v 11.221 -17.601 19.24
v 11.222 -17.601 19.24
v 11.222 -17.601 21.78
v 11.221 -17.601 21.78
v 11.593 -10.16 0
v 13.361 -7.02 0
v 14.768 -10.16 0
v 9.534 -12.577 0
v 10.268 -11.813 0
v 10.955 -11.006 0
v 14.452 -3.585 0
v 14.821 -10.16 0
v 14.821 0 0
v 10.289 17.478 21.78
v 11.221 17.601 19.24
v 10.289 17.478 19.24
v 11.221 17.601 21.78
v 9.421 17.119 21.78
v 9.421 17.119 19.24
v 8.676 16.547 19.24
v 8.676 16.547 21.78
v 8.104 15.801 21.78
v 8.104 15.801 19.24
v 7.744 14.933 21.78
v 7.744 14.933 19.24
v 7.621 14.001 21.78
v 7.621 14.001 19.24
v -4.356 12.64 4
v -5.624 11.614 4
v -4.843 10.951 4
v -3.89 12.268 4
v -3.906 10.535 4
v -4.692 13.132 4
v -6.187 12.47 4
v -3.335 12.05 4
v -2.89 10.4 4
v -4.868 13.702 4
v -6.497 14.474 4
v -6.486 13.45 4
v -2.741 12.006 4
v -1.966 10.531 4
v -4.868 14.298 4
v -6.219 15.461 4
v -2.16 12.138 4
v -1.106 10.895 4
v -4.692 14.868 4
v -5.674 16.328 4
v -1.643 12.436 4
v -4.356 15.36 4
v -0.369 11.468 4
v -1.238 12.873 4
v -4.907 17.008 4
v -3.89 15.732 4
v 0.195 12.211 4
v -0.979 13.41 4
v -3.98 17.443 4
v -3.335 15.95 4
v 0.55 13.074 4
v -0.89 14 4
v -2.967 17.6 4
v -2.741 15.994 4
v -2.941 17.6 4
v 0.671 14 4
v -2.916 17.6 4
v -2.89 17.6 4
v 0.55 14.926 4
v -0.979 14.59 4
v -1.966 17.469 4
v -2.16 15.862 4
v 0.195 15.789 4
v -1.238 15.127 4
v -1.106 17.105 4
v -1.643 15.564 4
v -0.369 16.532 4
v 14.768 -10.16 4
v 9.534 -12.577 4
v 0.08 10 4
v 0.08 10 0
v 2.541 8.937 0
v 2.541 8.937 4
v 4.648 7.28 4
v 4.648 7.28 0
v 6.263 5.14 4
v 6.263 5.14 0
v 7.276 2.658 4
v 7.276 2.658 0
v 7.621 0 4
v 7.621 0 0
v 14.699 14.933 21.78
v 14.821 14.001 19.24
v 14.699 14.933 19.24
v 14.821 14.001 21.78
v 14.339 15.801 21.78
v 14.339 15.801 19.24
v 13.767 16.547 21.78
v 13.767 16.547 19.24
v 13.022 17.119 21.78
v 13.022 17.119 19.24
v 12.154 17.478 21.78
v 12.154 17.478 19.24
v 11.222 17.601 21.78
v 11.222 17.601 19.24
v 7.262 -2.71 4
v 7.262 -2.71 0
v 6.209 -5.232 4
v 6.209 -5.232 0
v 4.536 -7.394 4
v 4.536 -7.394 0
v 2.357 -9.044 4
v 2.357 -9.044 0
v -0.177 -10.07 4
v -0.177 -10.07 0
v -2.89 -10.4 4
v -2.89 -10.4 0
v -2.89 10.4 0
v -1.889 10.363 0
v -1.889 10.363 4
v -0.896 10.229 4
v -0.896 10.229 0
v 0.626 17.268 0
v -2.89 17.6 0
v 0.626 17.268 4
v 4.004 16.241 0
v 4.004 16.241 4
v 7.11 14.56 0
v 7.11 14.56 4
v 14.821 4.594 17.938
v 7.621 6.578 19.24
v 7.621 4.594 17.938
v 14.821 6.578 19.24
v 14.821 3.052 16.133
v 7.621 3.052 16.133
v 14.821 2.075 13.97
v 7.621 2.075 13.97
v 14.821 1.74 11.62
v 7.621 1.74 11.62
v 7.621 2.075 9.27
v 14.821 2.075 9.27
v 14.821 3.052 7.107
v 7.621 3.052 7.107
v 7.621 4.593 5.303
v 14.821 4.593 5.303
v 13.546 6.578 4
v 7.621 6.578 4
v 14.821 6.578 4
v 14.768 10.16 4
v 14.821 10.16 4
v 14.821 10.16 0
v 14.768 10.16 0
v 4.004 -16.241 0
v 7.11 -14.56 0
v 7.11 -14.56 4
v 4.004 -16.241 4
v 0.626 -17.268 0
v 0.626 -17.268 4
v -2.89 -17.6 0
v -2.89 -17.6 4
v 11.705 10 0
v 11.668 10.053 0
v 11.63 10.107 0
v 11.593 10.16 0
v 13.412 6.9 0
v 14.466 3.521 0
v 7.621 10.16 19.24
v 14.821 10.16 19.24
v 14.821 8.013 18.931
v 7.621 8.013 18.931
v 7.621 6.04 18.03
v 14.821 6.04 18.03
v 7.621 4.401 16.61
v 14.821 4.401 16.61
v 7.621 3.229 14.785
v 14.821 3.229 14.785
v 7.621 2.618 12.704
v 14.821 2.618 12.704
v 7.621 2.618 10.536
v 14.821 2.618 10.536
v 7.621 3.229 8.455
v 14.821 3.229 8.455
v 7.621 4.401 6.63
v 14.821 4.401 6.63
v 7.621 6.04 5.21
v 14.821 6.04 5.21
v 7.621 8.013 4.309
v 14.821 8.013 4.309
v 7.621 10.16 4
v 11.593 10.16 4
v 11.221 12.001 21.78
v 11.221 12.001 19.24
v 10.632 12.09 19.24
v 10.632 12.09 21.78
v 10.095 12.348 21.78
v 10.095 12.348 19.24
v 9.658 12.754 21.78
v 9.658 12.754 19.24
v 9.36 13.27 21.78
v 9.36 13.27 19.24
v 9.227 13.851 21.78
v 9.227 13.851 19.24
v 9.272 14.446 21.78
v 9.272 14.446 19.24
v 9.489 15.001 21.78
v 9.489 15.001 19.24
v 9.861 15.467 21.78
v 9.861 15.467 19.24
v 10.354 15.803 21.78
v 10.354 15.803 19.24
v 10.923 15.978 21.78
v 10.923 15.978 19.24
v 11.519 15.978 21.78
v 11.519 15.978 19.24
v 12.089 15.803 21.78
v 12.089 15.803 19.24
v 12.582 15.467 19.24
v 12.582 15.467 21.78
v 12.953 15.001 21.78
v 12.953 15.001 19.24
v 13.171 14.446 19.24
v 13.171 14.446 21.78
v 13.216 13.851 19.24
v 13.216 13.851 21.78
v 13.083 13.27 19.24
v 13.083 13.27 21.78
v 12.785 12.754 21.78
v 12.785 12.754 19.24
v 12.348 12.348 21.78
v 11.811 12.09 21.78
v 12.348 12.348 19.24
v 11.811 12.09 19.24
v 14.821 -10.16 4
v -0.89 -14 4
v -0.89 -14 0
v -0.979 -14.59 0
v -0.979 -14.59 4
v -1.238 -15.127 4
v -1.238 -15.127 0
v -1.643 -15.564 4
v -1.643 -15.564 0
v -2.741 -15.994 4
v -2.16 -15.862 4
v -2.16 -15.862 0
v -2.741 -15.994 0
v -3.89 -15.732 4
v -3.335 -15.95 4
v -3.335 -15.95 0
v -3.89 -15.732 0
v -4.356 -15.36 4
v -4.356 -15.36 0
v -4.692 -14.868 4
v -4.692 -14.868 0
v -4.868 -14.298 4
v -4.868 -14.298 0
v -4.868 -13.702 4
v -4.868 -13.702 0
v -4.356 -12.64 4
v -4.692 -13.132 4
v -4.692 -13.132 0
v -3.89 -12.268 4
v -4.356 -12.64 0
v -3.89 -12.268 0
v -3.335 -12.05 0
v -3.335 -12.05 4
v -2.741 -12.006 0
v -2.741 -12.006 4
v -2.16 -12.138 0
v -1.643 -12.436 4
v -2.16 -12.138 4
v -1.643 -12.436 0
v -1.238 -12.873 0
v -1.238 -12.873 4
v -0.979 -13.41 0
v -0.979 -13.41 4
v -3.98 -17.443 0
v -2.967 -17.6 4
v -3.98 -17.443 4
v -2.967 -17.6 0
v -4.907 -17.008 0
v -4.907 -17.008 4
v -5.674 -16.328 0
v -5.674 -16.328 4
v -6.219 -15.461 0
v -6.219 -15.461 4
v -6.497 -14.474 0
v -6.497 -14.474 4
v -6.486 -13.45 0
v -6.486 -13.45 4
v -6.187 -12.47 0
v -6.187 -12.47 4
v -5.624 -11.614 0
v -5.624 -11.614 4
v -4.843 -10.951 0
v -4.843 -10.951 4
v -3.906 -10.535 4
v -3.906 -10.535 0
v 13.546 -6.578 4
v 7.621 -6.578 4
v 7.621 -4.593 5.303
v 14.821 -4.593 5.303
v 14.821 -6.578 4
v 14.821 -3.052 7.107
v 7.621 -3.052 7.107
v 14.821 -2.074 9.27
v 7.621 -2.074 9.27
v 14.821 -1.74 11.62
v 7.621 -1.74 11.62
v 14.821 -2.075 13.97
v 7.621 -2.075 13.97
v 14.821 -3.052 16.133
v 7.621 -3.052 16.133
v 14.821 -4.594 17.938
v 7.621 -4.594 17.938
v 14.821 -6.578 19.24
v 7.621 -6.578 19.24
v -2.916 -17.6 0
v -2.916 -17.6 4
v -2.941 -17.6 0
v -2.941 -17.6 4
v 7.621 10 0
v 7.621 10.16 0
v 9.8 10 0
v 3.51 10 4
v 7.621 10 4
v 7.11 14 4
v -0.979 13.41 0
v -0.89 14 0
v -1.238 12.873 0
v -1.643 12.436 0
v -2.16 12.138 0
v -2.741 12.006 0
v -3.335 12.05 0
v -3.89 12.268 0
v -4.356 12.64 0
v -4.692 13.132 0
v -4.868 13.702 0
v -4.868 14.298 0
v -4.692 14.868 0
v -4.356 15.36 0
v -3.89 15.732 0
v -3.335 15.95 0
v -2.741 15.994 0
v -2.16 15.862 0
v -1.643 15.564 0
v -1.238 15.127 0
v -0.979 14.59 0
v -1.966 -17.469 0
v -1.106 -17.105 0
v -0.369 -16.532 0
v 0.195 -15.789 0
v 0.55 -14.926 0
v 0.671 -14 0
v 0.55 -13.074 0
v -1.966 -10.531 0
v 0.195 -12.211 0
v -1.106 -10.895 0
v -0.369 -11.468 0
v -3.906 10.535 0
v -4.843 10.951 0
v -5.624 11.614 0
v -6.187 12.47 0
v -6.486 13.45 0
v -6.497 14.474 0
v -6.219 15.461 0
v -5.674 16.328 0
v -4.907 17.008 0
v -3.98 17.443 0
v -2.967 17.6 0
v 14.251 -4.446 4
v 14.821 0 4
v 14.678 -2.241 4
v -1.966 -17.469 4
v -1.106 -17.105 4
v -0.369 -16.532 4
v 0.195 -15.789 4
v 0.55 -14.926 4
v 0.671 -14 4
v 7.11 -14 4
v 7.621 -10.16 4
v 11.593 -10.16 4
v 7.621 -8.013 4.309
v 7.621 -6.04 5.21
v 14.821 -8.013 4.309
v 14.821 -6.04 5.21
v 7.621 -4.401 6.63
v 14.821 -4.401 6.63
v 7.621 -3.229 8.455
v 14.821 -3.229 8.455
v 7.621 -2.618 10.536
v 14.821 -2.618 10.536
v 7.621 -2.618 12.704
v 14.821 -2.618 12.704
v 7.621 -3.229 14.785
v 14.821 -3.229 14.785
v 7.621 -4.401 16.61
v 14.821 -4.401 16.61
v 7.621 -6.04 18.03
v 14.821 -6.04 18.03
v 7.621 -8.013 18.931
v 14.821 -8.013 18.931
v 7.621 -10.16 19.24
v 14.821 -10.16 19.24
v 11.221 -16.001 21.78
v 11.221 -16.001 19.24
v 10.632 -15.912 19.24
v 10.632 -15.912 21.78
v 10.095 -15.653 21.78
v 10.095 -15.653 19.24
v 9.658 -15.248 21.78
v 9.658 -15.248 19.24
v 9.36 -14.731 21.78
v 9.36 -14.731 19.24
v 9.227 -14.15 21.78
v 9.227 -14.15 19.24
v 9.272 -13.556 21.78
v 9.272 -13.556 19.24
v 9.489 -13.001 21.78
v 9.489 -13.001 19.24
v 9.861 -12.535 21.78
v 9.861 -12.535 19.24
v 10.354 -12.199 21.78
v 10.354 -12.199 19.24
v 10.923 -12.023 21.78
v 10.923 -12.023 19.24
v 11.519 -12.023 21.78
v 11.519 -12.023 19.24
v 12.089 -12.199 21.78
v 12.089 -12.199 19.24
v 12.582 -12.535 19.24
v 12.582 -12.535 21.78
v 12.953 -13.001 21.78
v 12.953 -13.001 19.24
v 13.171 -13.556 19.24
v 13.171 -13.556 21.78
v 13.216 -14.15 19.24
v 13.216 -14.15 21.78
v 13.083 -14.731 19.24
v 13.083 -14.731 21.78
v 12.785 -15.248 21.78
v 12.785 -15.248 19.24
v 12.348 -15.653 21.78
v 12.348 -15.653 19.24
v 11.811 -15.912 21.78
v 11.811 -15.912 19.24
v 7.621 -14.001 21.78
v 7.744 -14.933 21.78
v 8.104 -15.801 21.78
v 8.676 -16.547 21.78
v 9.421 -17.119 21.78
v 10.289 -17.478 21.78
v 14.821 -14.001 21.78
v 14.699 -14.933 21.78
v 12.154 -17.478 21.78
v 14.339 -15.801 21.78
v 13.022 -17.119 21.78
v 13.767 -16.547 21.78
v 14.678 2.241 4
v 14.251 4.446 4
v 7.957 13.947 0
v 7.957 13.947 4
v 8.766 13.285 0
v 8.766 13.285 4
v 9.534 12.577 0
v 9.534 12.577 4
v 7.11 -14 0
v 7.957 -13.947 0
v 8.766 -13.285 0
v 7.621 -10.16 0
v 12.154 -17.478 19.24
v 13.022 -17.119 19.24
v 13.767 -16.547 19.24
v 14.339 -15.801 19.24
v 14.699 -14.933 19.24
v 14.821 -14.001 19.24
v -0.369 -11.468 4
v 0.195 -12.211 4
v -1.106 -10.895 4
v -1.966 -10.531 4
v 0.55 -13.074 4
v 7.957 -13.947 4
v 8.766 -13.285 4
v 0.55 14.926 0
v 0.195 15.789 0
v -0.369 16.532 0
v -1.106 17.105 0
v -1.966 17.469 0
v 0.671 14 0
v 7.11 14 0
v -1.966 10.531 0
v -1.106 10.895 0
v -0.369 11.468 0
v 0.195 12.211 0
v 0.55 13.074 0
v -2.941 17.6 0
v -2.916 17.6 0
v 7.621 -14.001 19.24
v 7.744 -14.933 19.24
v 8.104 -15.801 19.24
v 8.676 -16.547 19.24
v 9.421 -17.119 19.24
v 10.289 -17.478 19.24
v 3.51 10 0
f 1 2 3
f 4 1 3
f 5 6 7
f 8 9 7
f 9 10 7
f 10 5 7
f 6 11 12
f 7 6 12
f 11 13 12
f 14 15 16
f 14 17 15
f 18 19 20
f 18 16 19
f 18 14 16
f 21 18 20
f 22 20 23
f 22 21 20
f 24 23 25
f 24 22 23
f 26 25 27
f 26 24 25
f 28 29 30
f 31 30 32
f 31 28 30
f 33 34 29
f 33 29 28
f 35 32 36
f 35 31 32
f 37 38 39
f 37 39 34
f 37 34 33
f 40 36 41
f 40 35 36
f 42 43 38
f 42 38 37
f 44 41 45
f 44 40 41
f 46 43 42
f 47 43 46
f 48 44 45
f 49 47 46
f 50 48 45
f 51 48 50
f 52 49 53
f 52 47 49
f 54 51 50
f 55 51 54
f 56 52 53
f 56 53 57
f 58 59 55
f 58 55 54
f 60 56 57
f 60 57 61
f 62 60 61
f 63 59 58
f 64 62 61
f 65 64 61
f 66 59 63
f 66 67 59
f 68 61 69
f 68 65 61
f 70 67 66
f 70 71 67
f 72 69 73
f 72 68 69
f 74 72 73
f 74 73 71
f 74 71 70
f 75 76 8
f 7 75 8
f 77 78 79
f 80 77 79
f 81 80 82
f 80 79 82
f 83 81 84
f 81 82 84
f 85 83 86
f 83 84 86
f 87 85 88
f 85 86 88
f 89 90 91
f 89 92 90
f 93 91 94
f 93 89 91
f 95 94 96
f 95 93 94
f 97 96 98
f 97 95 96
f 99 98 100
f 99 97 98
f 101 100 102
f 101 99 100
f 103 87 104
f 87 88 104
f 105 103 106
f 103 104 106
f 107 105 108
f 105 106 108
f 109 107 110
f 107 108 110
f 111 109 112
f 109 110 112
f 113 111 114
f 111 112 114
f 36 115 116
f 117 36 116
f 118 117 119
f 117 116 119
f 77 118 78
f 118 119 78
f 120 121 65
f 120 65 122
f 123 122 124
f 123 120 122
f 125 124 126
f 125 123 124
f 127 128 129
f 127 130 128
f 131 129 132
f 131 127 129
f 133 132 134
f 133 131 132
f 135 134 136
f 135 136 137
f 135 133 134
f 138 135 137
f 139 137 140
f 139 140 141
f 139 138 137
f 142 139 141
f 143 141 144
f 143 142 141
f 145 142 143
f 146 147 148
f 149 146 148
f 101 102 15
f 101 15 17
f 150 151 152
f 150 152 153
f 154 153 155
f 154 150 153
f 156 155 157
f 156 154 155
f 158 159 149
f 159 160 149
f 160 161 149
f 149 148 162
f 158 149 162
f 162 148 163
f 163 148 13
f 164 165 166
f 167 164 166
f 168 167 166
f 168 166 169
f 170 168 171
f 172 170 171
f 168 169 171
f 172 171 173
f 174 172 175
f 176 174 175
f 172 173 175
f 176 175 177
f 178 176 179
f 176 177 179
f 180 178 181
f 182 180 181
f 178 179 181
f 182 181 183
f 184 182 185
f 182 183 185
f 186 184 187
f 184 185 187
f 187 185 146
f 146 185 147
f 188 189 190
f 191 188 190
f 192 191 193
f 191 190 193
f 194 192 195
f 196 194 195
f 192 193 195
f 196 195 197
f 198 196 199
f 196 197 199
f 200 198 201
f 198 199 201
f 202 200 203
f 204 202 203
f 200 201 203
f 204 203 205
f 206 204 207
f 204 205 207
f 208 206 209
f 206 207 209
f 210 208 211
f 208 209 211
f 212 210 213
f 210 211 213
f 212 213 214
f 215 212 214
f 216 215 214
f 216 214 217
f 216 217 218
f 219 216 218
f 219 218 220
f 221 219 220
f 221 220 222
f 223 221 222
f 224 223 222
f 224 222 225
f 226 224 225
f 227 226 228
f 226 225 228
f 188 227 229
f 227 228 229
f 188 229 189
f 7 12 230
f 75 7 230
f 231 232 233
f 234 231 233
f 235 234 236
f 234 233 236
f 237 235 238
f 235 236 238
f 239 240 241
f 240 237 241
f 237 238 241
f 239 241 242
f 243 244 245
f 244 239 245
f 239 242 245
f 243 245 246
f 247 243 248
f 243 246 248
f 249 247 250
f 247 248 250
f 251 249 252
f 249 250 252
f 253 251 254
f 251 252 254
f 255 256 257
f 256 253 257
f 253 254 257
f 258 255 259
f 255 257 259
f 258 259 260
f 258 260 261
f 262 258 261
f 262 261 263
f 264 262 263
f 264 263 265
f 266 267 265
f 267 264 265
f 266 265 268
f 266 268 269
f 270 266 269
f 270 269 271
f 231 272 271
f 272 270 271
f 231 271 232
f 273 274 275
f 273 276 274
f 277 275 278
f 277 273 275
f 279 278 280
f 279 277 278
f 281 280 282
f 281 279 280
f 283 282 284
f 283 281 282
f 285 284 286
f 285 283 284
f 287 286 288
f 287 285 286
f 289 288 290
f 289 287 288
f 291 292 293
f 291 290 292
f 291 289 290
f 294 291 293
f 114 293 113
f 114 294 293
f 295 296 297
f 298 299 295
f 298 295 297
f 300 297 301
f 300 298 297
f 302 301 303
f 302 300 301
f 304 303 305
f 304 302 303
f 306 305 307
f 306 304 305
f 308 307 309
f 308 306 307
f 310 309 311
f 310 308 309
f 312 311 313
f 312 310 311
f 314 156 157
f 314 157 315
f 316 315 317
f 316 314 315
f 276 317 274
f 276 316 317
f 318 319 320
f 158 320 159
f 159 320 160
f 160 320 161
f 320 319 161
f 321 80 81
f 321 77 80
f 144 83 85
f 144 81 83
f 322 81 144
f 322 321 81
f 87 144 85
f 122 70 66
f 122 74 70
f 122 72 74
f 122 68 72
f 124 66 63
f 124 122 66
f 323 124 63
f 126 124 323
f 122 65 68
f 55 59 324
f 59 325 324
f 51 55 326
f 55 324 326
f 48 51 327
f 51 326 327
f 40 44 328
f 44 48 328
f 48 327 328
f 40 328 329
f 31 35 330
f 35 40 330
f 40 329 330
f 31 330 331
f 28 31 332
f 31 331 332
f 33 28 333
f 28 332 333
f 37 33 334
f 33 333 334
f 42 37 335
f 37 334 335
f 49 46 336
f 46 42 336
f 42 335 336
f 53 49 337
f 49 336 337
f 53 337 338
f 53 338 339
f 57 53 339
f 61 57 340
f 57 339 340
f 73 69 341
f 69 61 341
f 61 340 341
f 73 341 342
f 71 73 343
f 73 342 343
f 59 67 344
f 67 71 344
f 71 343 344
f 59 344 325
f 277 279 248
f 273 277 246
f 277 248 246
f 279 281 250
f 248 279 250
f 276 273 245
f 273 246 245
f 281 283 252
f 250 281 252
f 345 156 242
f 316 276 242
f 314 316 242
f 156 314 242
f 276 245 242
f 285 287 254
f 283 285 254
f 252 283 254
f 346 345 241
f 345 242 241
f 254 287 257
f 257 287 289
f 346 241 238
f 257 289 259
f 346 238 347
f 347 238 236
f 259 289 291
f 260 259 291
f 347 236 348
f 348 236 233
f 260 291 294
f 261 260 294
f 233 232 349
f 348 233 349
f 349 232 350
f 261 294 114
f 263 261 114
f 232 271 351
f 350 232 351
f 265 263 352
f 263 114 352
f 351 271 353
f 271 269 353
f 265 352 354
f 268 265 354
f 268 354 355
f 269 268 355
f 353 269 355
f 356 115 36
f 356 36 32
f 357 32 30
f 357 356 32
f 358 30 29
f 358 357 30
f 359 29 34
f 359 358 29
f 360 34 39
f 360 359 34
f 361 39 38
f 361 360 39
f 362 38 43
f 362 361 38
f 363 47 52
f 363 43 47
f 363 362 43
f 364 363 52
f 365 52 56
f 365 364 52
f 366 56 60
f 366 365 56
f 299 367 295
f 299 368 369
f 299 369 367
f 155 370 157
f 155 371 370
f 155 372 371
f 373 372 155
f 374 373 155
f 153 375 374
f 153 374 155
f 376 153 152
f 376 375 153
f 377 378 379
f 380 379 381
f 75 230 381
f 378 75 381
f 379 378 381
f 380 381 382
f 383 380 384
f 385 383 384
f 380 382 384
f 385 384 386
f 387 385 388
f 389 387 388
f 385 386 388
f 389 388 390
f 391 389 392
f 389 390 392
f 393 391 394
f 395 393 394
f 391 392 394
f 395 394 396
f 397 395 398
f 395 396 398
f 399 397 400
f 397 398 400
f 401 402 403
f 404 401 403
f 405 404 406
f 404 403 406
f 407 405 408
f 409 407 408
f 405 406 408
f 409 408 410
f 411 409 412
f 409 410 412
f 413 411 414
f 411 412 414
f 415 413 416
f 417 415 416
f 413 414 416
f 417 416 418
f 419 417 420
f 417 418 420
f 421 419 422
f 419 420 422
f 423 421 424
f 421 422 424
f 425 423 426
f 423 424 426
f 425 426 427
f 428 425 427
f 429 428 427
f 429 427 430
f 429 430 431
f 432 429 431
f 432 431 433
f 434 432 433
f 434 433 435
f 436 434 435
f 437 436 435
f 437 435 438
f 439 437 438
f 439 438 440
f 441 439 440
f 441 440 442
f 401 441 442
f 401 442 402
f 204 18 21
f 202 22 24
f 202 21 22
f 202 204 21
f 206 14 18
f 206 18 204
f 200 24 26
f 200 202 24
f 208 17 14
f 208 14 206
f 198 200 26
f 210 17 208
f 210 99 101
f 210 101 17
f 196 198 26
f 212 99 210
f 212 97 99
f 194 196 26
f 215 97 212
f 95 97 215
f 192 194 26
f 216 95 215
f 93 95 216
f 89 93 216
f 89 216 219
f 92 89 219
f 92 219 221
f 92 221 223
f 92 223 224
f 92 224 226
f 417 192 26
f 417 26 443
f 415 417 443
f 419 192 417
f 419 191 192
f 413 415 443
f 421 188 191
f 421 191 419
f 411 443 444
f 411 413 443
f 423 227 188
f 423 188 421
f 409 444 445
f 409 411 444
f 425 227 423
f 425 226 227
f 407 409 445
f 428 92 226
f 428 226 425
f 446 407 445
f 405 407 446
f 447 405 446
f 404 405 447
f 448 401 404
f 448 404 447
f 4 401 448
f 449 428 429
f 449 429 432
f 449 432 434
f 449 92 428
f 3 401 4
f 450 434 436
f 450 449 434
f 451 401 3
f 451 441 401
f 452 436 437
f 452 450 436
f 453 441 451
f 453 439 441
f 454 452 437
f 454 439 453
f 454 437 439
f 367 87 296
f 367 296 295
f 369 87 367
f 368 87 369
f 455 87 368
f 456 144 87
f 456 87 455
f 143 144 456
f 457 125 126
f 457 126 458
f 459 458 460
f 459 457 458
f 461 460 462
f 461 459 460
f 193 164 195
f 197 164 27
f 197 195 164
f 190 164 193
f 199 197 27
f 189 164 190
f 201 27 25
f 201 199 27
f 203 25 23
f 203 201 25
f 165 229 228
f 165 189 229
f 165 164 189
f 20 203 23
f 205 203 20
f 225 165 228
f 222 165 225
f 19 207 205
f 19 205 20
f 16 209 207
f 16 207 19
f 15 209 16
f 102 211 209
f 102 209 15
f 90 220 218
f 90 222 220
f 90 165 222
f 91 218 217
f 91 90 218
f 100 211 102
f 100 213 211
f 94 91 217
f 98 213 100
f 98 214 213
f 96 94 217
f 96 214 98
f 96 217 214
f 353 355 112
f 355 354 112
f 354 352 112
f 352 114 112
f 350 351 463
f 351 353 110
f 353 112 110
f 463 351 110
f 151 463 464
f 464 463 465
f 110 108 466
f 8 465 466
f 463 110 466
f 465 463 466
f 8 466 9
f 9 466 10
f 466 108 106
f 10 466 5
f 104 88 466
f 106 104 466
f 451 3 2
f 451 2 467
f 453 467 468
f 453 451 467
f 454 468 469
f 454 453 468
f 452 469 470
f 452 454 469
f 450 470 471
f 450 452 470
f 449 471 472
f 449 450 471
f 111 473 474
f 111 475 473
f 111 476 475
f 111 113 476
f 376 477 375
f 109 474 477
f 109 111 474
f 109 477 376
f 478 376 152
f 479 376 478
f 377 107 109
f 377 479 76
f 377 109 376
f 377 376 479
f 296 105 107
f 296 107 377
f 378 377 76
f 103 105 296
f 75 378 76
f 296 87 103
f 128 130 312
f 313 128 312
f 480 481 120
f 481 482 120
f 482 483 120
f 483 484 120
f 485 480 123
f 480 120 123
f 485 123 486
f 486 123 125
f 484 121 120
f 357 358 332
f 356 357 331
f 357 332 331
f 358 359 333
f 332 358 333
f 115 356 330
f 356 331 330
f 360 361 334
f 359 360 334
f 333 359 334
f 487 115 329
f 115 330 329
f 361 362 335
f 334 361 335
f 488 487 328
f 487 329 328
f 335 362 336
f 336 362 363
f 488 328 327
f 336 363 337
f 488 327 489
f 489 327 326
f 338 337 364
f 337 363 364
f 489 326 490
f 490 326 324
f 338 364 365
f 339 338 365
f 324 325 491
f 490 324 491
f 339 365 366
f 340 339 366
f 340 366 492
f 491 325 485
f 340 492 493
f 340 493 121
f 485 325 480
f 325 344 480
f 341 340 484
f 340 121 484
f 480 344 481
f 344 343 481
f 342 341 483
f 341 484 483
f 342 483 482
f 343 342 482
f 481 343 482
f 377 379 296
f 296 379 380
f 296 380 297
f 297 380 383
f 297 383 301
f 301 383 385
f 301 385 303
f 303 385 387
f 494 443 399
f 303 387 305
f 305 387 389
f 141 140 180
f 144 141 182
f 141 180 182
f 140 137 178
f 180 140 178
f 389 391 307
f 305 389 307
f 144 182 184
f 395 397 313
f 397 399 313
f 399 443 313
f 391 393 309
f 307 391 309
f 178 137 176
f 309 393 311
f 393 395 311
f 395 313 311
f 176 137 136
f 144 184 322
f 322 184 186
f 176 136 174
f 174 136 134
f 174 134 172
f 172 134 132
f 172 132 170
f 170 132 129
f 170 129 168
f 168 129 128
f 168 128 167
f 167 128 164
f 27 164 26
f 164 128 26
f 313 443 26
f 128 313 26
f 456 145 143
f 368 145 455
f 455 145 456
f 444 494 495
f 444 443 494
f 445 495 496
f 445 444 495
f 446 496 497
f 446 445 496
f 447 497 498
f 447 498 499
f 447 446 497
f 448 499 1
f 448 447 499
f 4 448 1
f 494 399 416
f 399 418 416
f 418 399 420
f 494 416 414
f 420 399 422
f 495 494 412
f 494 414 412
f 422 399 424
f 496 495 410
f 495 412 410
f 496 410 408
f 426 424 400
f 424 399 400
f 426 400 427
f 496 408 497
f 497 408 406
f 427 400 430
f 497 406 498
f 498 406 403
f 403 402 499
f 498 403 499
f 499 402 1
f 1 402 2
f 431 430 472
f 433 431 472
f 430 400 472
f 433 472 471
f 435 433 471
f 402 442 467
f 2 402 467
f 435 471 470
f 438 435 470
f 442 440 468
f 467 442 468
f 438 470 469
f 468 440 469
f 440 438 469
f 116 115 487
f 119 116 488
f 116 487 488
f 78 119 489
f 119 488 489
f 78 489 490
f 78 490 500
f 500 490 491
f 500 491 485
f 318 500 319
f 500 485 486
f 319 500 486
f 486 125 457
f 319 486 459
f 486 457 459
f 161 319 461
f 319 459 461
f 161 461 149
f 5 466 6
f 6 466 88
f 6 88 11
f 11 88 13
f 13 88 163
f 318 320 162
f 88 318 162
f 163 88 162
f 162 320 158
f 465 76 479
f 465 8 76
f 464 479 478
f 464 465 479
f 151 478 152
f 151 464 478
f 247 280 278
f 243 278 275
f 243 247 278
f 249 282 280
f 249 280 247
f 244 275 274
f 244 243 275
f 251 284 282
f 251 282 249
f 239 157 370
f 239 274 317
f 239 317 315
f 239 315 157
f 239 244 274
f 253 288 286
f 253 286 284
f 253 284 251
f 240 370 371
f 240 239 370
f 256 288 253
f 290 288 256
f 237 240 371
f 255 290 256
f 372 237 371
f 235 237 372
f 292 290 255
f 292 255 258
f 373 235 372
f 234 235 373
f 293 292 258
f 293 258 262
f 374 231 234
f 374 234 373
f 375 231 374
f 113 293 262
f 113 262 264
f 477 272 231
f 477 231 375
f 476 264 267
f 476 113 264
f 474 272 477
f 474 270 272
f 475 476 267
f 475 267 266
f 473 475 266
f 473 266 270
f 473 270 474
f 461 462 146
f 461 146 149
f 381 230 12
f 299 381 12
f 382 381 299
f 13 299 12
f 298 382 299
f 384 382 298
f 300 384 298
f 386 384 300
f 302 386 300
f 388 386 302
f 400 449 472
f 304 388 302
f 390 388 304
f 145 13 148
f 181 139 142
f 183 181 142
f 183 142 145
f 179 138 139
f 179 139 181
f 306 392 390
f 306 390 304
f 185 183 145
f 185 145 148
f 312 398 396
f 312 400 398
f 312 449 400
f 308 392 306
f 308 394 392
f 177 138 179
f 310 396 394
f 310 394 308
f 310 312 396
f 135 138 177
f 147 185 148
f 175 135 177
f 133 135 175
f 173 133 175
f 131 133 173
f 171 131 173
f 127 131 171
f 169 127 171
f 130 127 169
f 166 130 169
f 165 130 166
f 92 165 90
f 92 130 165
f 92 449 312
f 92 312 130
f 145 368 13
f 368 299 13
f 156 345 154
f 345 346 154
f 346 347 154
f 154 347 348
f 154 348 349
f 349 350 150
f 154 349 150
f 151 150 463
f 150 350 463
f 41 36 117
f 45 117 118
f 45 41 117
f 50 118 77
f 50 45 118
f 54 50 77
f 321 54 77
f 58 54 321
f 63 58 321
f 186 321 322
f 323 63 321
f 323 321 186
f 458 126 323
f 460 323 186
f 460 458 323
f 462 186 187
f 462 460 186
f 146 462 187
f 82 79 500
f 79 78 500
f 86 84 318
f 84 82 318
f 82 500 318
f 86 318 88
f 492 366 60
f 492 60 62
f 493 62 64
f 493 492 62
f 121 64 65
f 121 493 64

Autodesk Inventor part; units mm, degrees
ref_plane "YZ Plane" through (0, 0, 0) normal (1, 0, 0) x (0, 1, 0)
ref_plane "XZ Plane" through (0, 0, 0) normal (0, 1, 0) x (-1, 0, 0)
ref_plane "XY Plane" through (0, 0, 0) normal (0, 0, 1) x (1, 0, 0)
sketch "Sketch1" plane through (0, 0, 0) normal (0, 0, 1) x (1, 0, 0)
  circle A0 centre (-2.8902, -14) radius 2 projected
  line L0 (-2.8902, -17.5998) -> (-2.8902, -19) projected
  line L1 (7.1098, -19) -> (-2.8902, -19) projected
  line L2 (7.1098, -14) -> (7.1098, -19) projected
  line L3 (7.1098, -14) -> (0.6714, -14) projected
  arc A1 (0.6714, -14) -> (-2.8902, -10.4002) centre (-2.9286, -14) ccw projected
  arc A2 (-2.8902, -10.4002) -> (-2.8902, -17.5998) centre (-2.9286, -14) ccw projected
  circle A3 centre (-2.8902, 14) radius 2 projected
  line L4 (-2.8902, 17.5998) -> (-2.8902, 19) projected
  arc A4 (-2.8902, 17.5998) -> (-2.8902, 10.4002) centre (-2.9286, 14) ccw projected
  arc A5 (-2.8902, 10.4002) -> (0.6714, 14) centre (-2.9286, 14) ccw projected
  line L5 (7.1098, 14) -> (0.6714, 14) projected
  line L6 (7.1098, 14) -> (7.1098, 19) projected
  line L7 (7.1098, 19) -> (-2.8902, 19) projected
  line L8 (9.8002, 10) -> (3.5098, 10) projected
  line L9 (-57.6094, 10) -> (18.5906, 10) projected
  arc A6 (-2.8902, -10.4002) -> (-2.8902, 10.4002) centre (-2.7794, 0) ccw
  circle A7 centre (-2.9286, -14) radius 3.6
  circle A8 centre (-2.9286, 14) radius 3.6
  arc A9 (-2.9669, -17.5998) -> (-2.9669, 17.5998) centre (-2.7794, 0) ccw
  point P0 (7.1098, 10)
  point P1 (0, 0)
  point P2 (-2.8902, -17.6004)
  point P3 (-2.8902, 17.6004)
extrude "Extrusion2" add sketch "Sketch1" along normal blind 4 contours A2 A1 A7 | A7 L3 L2 A9 | A1 A6 L9 L8 A9 L2 L3 | L9 L8 A6 A5 L5 L6 A9 | L6 L5 A8 A9 | A4 A8 A5
sketch "Sketch2" plane through (0, 0, 4) normal (0, 0, 1) x (1, 0, 0)
  arc A0 (-2.8902, -17.6004) -> (-2.8902, 17.6004) centre (-2.7794, 0) ccw projected
  point P0 (0, 0)
  point P1 (14.8214, 0)
ref_plane "Work Plane1" through (14.8214, 0, 4) normal (1, 0, 0) x (0, 1, 0)
sketch "Sketch3" plane through (14.8214, 0, 4) normal (1, 0, 0) x (0, 1, 0)
  line L0 (17.6008, 0) -> (-17.6008, 0) projected
  arc A0 (-10.16, 0) -> (-10.16, 15.24) centre (-10.16, 7.62) ccw
  line L1 (-10.16, 7.62) -> (-10.16, 0) construction
  line L2 (-10.16, 7.62) -> (-2.54, 7.62) construction
  line L3 (-10.16, 7.62) -> (-10.16, 15.24) construction
  arc A1 (-12.6408, -0.4263) -> (-10.96, 16.0019) centre (-10.16, 7.62) ccw
  line L4 (-10.96, 16.0019) -> (-10.96, 9.0533) construction
  line L5 (0, 0) -> (0, 16.929) construction
  line L6 (-10.16, 15.24) -> (0, 15.24)
  line L7 (-10.16, 15.24) -> (-17.6008, 15.24)
  line L8 (-17.6008, 15.24) -> (-17.6008, 17.78)
  line L9 (-17.6008, 17.78) -> (0, 17.78)
  line L10 (-10.16, 0) -> (-10.16, -0.8)
  line L11 (17.6008, -4) -> (-17.6008, -4) projected
  line L12 (-10.16, 0) -> (0, 0)
  line L13 (0, 0) -> (0, -4)
  line L14 (0, -4) -> (-10.16, -4)
  line L15 (-10.16, -4) -> (-10.16, 0)
  arc A2 (10.16, 15.24) -> (10.16, 0) centre (10.16, 7.62) ccw
  line L16 (10.16, 7.62) -> (10.16, 0) construction
  line L17 (10.16, 7.62) -> (2.54, 7.62) construction
  line L18 (10.16, 7.62) -> (10.16, 15.24) construction
  arc A3 (10.96, 16.0019) -> (12.6408, -0.4263) centre (10.16, 7.62) ccw
  line L19 (10.96, 16.0019) -> (10.96, 9.0533) construction
  line L20 (10.16, 15.24) -> (0, 15.24)
  line L21 (10.16, 15.24) -> (17.6008, 15.24)
  line L22 (17.6008, 15.24) -> (17.6008, 17.78)
  line L23 (17.6008, 17.78) -> (0, 17.78)
  line L24 (10.16, 0) -> (10.16, -0.8)
  line L25 (10.16, 0) -> (0, 0)
  line L26 (0, -4) -> (10.16, -4)
  line L27 (10.16, -4) -> (10.16, 0)
  point P0 (-17.6004, 0)
  point P1 (17.6004, 0)
  point P2 (-17.6004, -4)
  point P3 (17.6004, -4)
  point P4 (-6.5778, 0)
  point P5 (-6.5778, 15.24)
  point P6 (6.5778, 15.24)
  point P7 (6.5778, 0)
  dimension "d4" = 90
  dimension "d5" = 180
  dimension "d6" = 0.8
  dimension "d7" = 7.62
  dimension "d8" = 10.16
  dimension "d9" = 2.54
extrude "Extrusion3" add sketch "Sketch3" against normal blind 7.2 contours L24 A3 L0 | L0 A3 L20 A2 | A3 L27 L11 L13 L0 | L20 L6 L7 L8 L9 L23 L22 L21 | L13 L11 L15 A1 L0 | A1 L10 L0 | L0 A0 L6 A1
chamfer "Chamfer1" distance 3.175 angle 45 2 edges at (11.5929, -10.16, 2) (11.5929, 10.16, 2)
fillet "Fillet1" radius 3.6 4 edges at (14.8214, -17.6008, 20.51) (14.8214, 17.6008, 20.51) (7.6214, 17.6008, 20.51) (7.6214, -17.6008, 20.51)
sketch "Sketch4" plane through (14.8214, -14.0008, 21.78) normal (0, 0, 1) x (1, 0, 0)
  arc A0 (-7.2, 0) -> (0, 0) centre (-3.6, 0) ccw projected
  line L0 (0, 28.0016) -> (0, 0) projected
  arc A1 (0, 28.0016) -> (-7.2, 28.0016) centre (-3.6, 28.0016) ccw projected
  line L1 (-7.2, 0) -> (-7.2, 28.0016) projected
  circle A2 centre (-3.6, 0) radius 2
  circle A3 centre (-3.6, 28.0016) radius 2
  point P0 (-14.8214, 14.0008)
  dimension "d16" = 4
  dimension "d17" = 4
hole "Hole1" at (11.2214, -14.0008, 21.78) at (11.2214, 14.0008, 21.78) direction (0, 0, -1) diameter 4 depth 6
properties part number "MotorMountTopSuspension"
